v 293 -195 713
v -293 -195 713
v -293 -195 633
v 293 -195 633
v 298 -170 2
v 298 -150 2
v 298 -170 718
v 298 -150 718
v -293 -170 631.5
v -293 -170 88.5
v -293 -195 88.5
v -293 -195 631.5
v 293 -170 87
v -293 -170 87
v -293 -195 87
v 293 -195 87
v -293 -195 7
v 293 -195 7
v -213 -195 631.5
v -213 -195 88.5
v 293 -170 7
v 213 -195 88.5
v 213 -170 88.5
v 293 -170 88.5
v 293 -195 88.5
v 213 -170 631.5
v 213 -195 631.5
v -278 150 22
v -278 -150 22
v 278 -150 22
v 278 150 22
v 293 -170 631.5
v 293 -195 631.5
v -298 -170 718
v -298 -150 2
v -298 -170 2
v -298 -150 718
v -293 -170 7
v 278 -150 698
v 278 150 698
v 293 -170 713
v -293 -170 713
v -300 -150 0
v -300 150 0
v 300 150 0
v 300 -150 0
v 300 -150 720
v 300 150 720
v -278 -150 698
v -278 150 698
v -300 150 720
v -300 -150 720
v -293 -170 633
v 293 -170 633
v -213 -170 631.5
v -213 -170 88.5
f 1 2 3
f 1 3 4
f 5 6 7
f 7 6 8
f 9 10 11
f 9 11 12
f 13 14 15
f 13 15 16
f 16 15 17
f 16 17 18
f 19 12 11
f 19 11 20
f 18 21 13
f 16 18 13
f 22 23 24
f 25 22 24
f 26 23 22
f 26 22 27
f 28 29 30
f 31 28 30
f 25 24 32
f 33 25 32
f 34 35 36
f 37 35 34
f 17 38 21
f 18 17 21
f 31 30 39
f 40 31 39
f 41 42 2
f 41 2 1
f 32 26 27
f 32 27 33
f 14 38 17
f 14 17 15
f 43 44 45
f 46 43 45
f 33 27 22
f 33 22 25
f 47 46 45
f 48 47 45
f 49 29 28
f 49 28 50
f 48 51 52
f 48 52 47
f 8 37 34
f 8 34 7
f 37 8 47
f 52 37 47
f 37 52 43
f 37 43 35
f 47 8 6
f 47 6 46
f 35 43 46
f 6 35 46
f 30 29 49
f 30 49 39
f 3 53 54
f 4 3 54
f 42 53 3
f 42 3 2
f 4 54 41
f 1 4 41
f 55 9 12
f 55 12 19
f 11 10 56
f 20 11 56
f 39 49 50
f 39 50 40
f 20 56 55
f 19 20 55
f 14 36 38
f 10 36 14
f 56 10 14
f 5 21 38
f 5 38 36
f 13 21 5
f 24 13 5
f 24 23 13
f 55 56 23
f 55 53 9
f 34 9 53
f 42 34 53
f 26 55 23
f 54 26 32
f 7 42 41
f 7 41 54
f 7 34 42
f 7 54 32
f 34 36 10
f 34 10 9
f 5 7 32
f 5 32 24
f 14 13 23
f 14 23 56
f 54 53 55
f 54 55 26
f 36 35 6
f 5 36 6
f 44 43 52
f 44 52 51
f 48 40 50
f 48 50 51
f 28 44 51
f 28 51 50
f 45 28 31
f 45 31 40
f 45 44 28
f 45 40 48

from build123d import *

# Parameters (mm, degrees)
F0_W     = 600
F0_H     = 300
F1_DEPTH = 720
F2_W     = 556
F2_H     = 676
F3_DEPTH = 300
F4_W     = 596
F4_H     = 716
F5_DEPTH = 20
F6_W     = 586
F6_H     = 80
F6_W_2   = 80
F6_H_2   = 543
F7_DEPTH = 25


with BuildPart() as f1:
    # F0 (on Top) → F1 (new body)
    with BuildSketch(Plane.XY):
        Rectangle(F0_W, F0_H)
    extrude(amount=F1_DEPTH)

    # F2 (on face) → F3 (cut, through all)
    with BuildSketch(Plane.XZ.offset(150)):
        with Locations((0, 360)):
            Rectangle(F2_W, F2_H)
    extrude(amount=-F3_DEPTH, mode=Mode.SUBTRACT)

    # F4 (on face) → F5 (join)
    with BuildSketch(Plane.XZ.offset(150)):
        with Locations((0, 360)):
            Rectangle(F4_W, F4_H)
    extrude(amount=F5_DEPTH)

    # F6 (on face) → F7 (join)
    with BuildSketch(Plane.XZ.offset(170)):
        with Locations((0, 673)):
            Rectangle(F6_W, F6_H)
        with Locations((-253, 360)):
            Rectangle(F6_W_2, F6_H_2)
        with Locations((253, 360)):
            Rectangle(F6_W_2, F6_H_2)
        with Locations((0, 47)):
            Rectangle(F6_W, F6_H)
    extrude(amount=F7_DEPTH)


solid = f1.part
